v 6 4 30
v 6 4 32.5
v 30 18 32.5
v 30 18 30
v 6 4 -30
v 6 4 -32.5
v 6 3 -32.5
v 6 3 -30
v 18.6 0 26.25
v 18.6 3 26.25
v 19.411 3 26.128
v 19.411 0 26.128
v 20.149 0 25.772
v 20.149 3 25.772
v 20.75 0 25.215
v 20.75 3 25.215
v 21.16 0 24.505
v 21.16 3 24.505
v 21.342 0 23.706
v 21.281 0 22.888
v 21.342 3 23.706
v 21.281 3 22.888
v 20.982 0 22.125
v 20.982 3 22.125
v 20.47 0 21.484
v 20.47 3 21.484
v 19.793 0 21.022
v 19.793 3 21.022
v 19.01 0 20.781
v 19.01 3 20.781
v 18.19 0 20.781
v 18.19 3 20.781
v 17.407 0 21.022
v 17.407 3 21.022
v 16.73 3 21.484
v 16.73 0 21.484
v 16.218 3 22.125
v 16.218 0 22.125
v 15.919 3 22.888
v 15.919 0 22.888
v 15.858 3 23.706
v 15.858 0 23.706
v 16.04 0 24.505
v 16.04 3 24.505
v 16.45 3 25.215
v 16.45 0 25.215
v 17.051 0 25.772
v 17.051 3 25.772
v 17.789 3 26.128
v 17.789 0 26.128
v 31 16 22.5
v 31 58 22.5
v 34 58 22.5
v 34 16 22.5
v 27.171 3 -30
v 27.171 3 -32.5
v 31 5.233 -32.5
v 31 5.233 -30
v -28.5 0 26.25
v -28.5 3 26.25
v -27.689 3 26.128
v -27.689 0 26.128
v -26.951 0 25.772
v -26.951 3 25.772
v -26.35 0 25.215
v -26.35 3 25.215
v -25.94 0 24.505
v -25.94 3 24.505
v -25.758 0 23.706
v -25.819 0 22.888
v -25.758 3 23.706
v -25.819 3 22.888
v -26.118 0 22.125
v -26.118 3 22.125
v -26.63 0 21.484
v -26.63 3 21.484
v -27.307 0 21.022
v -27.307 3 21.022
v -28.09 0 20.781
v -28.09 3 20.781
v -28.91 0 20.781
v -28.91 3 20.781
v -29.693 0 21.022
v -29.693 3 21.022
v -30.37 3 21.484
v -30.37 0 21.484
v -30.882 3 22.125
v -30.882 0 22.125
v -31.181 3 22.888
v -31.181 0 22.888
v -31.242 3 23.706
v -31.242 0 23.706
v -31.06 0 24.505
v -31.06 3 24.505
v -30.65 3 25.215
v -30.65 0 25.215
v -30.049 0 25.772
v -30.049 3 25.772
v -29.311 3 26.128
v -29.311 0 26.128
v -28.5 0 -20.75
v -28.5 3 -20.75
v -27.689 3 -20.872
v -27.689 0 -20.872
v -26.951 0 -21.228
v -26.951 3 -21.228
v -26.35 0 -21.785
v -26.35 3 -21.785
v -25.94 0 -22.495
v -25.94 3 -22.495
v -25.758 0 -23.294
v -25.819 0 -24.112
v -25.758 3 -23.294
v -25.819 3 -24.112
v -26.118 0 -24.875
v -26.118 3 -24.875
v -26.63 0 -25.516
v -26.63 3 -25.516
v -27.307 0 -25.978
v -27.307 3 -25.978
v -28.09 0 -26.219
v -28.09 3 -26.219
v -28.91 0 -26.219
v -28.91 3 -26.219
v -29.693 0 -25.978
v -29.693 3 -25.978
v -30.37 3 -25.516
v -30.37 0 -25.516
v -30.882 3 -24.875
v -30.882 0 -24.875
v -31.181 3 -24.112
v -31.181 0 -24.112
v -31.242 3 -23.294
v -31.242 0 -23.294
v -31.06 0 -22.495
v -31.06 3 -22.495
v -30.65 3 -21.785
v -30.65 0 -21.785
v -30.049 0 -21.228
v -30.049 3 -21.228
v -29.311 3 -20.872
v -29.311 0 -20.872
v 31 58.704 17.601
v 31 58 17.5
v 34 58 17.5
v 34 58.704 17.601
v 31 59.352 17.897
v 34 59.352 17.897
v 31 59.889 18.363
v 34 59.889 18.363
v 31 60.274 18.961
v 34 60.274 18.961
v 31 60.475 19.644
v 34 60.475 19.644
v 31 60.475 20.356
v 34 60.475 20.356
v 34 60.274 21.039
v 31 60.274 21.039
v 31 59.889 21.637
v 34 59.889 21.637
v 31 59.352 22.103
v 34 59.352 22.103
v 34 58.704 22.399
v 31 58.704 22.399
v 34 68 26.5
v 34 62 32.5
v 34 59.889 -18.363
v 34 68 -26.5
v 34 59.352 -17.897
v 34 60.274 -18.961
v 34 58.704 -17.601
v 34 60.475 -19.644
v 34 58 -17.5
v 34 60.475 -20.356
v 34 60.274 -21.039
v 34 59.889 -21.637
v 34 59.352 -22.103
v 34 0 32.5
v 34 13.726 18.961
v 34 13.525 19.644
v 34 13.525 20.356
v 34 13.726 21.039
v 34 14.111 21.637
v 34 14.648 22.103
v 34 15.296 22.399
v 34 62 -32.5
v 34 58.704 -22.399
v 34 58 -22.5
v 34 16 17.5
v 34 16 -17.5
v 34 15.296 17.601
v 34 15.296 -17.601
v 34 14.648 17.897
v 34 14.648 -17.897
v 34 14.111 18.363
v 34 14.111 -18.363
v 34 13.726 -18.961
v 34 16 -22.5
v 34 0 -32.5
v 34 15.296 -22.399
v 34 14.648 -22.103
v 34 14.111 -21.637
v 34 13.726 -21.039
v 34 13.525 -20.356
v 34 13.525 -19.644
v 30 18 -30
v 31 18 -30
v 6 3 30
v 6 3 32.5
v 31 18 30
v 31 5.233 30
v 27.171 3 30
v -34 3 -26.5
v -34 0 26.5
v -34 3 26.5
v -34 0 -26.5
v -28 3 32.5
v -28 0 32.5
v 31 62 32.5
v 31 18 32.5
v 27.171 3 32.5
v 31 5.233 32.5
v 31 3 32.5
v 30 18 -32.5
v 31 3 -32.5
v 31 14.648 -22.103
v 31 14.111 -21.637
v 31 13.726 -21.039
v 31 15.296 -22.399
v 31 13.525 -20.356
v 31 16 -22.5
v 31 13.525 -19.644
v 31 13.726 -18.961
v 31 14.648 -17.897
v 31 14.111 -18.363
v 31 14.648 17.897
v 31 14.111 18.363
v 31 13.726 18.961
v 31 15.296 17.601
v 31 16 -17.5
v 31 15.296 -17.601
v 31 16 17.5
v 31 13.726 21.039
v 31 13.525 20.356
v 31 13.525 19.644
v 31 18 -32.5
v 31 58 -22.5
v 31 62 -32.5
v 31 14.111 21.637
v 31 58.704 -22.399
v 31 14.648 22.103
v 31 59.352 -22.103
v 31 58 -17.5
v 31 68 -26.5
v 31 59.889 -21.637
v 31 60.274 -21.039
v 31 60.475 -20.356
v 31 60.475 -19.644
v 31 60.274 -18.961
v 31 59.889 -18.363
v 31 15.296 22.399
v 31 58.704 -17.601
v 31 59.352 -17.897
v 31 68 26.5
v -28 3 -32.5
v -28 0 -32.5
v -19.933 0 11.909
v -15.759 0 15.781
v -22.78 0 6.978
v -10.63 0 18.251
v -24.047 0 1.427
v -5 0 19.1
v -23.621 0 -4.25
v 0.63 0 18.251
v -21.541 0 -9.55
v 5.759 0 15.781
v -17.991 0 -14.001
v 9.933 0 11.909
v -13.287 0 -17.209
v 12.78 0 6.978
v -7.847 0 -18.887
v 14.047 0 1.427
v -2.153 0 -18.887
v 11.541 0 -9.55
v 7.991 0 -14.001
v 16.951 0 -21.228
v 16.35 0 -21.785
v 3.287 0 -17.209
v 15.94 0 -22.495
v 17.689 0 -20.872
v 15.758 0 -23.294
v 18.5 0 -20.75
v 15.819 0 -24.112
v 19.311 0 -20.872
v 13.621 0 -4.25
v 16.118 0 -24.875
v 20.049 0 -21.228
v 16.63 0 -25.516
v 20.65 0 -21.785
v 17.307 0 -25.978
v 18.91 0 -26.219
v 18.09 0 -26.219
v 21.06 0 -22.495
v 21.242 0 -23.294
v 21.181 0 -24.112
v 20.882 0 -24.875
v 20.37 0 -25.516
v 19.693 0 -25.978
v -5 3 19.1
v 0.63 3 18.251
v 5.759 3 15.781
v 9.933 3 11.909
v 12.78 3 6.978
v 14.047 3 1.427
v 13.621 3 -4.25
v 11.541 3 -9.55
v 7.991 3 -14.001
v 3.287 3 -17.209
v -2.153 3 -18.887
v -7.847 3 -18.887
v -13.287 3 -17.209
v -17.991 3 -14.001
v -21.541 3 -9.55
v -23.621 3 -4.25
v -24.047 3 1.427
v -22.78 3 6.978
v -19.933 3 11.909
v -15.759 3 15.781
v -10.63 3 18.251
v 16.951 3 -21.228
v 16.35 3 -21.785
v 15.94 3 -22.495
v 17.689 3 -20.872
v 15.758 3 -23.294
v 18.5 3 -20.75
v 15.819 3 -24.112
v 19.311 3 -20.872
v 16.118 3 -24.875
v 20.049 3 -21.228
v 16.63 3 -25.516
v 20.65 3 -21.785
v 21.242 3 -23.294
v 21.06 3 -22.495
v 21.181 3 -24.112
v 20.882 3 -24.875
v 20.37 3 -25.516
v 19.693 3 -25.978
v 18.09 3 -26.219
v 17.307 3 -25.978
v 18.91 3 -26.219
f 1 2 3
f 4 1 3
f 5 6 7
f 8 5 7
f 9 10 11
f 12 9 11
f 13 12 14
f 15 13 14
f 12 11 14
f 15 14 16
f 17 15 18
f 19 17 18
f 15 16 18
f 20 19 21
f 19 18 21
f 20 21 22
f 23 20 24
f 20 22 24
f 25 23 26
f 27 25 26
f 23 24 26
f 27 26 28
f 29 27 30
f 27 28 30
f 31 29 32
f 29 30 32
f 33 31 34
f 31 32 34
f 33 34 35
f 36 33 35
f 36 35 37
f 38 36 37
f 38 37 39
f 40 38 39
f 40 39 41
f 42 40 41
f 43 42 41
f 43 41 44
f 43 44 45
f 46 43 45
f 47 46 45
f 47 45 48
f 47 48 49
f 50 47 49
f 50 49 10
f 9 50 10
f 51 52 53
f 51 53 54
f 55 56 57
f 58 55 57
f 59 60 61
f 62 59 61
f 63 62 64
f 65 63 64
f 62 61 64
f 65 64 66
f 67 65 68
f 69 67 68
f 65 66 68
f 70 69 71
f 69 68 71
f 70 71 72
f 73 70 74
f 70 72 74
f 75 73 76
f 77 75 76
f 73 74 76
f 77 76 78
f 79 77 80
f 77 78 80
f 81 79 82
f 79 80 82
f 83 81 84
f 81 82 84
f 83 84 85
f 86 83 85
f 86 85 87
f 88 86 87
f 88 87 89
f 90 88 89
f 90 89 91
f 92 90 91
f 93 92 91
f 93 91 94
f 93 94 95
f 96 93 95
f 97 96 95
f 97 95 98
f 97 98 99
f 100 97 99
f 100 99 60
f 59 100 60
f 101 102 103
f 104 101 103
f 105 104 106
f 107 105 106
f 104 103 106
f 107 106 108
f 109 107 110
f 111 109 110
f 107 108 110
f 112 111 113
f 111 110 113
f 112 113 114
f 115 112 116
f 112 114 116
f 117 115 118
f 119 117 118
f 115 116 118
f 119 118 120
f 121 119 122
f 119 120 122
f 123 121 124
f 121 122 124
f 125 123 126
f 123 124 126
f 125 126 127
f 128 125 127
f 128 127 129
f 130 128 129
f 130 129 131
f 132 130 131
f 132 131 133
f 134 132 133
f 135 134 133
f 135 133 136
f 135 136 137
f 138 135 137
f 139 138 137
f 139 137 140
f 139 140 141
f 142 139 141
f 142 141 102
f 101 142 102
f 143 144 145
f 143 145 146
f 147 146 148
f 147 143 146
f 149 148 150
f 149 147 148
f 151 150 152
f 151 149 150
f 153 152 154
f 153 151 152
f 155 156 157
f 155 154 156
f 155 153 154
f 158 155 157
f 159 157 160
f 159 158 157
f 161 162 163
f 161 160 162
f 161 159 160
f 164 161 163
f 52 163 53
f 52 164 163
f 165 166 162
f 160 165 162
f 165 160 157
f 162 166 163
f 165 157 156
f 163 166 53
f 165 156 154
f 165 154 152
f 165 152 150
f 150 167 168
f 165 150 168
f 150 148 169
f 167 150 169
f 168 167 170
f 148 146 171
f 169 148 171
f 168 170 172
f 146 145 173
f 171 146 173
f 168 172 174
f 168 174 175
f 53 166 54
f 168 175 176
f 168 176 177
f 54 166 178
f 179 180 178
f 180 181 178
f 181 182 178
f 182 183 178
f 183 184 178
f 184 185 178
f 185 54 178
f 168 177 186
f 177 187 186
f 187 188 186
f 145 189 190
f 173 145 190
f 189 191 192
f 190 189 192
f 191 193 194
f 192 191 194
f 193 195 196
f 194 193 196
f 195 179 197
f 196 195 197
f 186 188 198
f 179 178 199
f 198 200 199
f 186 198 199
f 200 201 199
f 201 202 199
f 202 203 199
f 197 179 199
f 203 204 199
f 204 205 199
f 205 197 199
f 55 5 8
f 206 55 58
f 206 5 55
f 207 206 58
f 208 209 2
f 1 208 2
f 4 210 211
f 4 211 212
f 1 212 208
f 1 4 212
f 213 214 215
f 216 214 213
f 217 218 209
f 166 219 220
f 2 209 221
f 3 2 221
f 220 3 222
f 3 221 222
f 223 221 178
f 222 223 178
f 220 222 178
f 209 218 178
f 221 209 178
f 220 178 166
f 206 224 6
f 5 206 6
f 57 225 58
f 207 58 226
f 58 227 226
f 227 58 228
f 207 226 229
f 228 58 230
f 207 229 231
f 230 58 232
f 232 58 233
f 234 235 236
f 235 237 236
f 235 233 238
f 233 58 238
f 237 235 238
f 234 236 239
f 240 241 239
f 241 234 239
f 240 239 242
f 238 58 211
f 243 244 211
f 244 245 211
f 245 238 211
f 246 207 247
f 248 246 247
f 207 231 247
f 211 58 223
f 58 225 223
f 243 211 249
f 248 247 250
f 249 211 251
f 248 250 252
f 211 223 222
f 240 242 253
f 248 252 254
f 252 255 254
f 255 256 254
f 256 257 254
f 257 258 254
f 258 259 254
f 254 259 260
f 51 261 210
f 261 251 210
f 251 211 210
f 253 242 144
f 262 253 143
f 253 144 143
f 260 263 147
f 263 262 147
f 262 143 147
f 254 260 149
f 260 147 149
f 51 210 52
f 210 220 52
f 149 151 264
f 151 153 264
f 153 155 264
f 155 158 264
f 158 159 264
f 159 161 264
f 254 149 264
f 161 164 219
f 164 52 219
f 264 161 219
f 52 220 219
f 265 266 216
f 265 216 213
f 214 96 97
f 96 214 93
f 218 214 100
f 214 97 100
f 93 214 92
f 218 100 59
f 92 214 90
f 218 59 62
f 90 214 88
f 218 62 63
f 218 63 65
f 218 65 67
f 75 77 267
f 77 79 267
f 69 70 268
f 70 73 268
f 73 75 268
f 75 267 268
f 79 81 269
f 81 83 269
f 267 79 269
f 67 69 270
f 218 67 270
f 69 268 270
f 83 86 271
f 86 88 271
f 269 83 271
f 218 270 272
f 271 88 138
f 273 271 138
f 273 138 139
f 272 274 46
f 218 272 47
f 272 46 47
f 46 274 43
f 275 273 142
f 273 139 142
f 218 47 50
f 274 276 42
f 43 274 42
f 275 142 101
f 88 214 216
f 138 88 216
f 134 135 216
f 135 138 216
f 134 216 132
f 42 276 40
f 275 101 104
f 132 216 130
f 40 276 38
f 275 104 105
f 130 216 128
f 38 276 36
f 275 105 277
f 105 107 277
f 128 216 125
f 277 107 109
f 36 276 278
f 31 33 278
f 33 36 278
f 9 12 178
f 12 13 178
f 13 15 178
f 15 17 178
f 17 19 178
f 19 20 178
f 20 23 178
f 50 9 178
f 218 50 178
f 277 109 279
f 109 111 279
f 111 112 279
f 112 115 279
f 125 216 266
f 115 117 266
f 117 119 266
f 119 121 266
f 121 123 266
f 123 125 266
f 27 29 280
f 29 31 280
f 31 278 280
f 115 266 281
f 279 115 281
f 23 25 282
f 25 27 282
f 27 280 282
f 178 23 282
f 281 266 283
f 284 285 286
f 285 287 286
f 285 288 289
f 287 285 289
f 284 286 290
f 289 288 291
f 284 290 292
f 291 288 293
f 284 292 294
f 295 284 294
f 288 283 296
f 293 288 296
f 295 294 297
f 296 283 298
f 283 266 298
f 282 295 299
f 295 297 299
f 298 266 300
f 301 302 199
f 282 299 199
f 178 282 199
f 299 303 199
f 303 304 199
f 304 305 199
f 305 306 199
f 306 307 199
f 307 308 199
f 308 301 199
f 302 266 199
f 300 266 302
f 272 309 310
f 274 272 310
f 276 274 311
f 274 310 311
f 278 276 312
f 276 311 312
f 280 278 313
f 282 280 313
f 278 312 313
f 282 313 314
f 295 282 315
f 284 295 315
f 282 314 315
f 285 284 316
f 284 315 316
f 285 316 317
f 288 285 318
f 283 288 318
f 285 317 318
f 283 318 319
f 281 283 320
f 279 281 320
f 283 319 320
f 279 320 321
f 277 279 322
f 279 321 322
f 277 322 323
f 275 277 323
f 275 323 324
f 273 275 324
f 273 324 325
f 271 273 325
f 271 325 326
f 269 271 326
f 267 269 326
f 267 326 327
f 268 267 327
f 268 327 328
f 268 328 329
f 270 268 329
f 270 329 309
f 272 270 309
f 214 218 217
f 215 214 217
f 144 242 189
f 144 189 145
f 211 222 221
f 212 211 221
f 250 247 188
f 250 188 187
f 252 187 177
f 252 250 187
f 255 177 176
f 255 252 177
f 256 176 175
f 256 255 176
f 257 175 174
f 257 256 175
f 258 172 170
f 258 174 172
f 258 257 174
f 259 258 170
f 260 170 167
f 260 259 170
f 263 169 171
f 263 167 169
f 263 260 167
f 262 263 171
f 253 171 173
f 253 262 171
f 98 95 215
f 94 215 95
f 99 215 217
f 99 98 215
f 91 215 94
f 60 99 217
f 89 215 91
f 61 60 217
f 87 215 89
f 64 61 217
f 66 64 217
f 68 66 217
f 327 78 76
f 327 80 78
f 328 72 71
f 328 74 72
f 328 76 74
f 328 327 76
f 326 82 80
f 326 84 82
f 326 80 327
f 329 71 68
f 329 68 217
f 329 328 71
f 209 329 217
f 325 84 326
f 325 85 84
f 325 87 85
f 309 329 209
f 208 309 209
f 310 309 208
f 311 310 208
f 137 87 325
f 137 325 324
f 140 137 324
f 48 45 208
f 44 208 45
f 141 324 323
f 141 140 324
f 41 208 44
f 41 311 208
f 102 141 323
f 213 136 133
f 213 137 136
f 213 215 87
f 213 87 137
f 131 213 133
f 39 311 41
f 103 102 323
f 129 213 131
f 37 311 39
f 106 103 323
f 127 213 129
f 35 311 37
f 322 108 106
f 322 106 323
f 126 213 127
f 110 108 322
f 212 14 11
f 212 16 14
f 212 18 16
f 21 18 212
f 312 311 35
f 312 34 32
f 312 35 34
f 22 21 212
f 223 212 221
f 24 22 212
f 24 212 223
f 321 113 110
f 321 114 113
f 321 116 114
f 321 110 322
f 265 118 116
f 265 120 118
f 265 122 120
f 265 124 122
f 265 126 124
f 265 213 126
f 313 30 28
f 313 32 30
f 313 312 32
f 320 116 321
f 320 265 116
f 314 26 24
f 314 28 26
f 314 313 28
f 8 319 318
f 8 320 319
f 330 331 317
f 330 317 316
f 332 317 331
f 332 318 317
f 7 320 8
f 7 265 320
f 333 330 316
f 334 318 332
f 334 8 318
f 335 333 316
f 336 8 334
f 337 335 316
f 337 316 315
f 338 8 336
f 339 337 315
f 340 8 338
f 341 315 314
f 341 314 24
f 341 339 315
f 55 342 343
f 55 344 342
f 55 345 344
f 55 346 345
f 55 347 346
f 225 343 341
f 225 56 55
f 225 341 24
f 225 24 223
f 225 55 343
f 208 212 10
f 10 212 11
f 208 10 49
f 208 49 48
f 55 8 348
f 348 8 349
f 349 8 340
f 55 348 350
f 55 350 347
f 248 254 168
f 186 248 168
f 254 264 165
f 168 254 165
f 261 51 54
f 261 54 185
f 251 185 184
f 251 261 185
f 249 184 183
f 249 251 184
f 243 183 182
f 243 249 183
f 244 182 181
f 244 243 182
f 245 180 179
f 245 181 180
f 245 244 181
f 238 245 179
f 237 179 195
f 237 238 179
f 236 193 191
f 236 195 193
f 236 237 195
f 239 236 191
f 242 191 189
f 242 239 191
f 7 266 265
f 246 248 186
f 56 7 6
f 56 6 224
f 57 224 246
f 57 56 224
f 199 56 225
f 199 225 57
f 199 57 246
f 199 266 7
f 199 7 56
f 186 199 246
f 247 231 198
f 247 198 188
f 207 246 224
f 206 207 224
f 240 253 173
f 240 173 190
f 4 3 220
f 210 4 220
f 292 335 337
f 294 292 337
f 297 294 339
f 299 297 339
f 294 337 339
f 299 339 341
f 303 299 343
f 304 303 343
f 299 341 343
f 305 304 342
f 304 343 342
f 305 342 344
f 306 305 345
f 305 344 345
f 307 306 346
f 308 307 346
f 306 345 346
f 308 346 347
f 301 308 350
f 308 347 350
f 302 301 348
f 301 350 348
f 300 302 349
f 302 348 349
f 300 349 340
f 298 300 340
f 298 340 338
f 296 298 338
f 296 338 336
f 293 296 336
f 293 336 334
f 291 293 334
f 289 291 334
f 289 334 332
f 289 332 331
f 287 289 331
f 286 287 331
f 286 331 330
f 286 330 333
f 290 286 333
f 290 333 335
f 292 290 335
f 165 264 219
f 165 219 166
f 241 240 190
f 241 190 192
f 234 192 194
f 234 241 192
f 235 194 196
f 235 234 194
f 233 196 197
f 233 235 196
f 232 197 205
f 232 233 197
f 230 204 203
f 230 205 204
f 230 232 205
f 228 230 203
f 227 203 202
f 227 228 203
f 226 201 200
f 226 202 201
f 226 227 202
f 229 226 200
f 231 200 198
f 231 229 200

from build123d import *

# Parameters (mm, degrees)
SKETCH1_W           = 68
SKETCH1_H           = 65
BOSS_EXTRUDE1_DEPTH = 3
SKETCH2_W           = 3
SKETCH2_H           = 68
BOSS_EXTRUDE2_DEPTH = 65
CHAMFER1_SIZE       = 6
SKETCH4_R           = 2.75
SKETCH4_R_2         = 19.1
CUT_EXTRUDE2_DEPTH  = 65
CUT_EXTRUDE3_DEPTH  = 65
BOSS_EXTRUDE3_DEPTH = 2.5
BOSS_EXTRUDE4_DEPTH = 2.5


with BuildPart() as part:
    # Sketch1 → Boss-Extrude1 (new body)
    with BuildSketch(Plane(origin=(0, 0, 0), x_dir=(1, 0, 0), z_dir=(0, 1, 0))):
        Rectangle(SKETCH1_W, SKETCH1_H)
    extrude(amount=BOSS_EXTRUDE1_DEPTH)

    # Sketch2 → Boss-Extrude2 (add)
    with BuildSketch(Plane.XY.offset(32.5)):
        with Locations((32.5, 34)):
            Rectangle(SKETCH2_W, SKETCH2_H)
    extrude(amount=-BOSS_EXTRUDE2_DEPTH)

    # Chamfer1
    chamfer1_edges = [part.edges().sort_by_distance(p)[0] for p in [
        (32.5, 68, -32.5),
        (32.5, 68, 32.5),
        (-34, 1.5, -32.5),
        (-34, 1.5, 32.5),
    ]]
    chamfer(chamfer1_edges, length=CHAMFER1_SIZE)

    # Sketch4 → Cut-Extrude2 (cut)
    with BuildSketch(Plane(origin=(0, 3, 0), x_dir=(1, 0, 0), z_dir=(0, 1, 0))):
        with Locations(Location((-28.5, 23.5, 0), (0, 0, 270))):
            Circle(SKETCH4_R)
        with Locations(Location((-28.5, -23.5, 0), (0, 0, 270))):
            Circle(SKETCH4_R)
        with Locations(Location((18.6, -23.5, 0), (0, 0, 270))):
            Circle(SKETCH4_R)
        with Locations(Location((18.5, 23.5, 0), (0, 0, 270))):
            Circle(SKETCH4_R)
        with Locations(Location((-5, 0, 0), (0, 0, 270))):
            Circle(SKETCH4_R_2)
    extrude(amount=-CUT_EXTRUDE2_DEPTH, mode=Mode.SUBTRACT)

    # Sketch5 → Cut-Extrude3 (cut)
    with BuildSketch(Plane.ZY.offset(-31)):
        with BuildLine():
            Line((-17.5, 58), (-17.5, 16))
            ThreePointArc((-17.5, 16), (-20, 13.5), (-22.5, 16))
            Line((-22.5, 16), (-22.5, 58))
            ThreePointArc((-22.5, 58), (-20, 60.5), (-17.5, 58))
        make_face()
        with BuildLine():
            Line((22.5, 58), (22.5, 16))
            ThreePointArc((22.5, 16), (20, 13.5), (17.5, 16))
            Line((17.5, 16), (17.5, 58))
            ThreePointArc((17.5, 58), (20, 60.5), (22.5, 58))
        make_face()
    extrude(amount=-CUT_EXTRUDE3_DEPTH, mode=Mode.SUBTRACT)

    # Sketch6 → Boss-Extrude3 (add)
    with BuildSketch(Plane.XY.offset(32.5)):
        Polygon((6, 3), (6, 4), (30, 18), (31, 18), (31, 5.233358358), (27.171385671, 3), align=None)
    extrude(amount=-BOSS_EXTRUDE3_DEPTH)

    # Sketch7 → Boss-Extrude4 (add)
    with BuildSketch(Plane(origin=(0, 0, -32.5), x_dir=(-1, 0, 0), z_dir=(0, 0, -1))):
        Polygon((-31, 18), (-30, 18), (-6, 4), (-6, 3), (-27.171385671, 3), (-31, 5.233358358), align=None)
    extrude(amount=-BOSS_EXTRUDE4_DEPTH)


solid = part.part
